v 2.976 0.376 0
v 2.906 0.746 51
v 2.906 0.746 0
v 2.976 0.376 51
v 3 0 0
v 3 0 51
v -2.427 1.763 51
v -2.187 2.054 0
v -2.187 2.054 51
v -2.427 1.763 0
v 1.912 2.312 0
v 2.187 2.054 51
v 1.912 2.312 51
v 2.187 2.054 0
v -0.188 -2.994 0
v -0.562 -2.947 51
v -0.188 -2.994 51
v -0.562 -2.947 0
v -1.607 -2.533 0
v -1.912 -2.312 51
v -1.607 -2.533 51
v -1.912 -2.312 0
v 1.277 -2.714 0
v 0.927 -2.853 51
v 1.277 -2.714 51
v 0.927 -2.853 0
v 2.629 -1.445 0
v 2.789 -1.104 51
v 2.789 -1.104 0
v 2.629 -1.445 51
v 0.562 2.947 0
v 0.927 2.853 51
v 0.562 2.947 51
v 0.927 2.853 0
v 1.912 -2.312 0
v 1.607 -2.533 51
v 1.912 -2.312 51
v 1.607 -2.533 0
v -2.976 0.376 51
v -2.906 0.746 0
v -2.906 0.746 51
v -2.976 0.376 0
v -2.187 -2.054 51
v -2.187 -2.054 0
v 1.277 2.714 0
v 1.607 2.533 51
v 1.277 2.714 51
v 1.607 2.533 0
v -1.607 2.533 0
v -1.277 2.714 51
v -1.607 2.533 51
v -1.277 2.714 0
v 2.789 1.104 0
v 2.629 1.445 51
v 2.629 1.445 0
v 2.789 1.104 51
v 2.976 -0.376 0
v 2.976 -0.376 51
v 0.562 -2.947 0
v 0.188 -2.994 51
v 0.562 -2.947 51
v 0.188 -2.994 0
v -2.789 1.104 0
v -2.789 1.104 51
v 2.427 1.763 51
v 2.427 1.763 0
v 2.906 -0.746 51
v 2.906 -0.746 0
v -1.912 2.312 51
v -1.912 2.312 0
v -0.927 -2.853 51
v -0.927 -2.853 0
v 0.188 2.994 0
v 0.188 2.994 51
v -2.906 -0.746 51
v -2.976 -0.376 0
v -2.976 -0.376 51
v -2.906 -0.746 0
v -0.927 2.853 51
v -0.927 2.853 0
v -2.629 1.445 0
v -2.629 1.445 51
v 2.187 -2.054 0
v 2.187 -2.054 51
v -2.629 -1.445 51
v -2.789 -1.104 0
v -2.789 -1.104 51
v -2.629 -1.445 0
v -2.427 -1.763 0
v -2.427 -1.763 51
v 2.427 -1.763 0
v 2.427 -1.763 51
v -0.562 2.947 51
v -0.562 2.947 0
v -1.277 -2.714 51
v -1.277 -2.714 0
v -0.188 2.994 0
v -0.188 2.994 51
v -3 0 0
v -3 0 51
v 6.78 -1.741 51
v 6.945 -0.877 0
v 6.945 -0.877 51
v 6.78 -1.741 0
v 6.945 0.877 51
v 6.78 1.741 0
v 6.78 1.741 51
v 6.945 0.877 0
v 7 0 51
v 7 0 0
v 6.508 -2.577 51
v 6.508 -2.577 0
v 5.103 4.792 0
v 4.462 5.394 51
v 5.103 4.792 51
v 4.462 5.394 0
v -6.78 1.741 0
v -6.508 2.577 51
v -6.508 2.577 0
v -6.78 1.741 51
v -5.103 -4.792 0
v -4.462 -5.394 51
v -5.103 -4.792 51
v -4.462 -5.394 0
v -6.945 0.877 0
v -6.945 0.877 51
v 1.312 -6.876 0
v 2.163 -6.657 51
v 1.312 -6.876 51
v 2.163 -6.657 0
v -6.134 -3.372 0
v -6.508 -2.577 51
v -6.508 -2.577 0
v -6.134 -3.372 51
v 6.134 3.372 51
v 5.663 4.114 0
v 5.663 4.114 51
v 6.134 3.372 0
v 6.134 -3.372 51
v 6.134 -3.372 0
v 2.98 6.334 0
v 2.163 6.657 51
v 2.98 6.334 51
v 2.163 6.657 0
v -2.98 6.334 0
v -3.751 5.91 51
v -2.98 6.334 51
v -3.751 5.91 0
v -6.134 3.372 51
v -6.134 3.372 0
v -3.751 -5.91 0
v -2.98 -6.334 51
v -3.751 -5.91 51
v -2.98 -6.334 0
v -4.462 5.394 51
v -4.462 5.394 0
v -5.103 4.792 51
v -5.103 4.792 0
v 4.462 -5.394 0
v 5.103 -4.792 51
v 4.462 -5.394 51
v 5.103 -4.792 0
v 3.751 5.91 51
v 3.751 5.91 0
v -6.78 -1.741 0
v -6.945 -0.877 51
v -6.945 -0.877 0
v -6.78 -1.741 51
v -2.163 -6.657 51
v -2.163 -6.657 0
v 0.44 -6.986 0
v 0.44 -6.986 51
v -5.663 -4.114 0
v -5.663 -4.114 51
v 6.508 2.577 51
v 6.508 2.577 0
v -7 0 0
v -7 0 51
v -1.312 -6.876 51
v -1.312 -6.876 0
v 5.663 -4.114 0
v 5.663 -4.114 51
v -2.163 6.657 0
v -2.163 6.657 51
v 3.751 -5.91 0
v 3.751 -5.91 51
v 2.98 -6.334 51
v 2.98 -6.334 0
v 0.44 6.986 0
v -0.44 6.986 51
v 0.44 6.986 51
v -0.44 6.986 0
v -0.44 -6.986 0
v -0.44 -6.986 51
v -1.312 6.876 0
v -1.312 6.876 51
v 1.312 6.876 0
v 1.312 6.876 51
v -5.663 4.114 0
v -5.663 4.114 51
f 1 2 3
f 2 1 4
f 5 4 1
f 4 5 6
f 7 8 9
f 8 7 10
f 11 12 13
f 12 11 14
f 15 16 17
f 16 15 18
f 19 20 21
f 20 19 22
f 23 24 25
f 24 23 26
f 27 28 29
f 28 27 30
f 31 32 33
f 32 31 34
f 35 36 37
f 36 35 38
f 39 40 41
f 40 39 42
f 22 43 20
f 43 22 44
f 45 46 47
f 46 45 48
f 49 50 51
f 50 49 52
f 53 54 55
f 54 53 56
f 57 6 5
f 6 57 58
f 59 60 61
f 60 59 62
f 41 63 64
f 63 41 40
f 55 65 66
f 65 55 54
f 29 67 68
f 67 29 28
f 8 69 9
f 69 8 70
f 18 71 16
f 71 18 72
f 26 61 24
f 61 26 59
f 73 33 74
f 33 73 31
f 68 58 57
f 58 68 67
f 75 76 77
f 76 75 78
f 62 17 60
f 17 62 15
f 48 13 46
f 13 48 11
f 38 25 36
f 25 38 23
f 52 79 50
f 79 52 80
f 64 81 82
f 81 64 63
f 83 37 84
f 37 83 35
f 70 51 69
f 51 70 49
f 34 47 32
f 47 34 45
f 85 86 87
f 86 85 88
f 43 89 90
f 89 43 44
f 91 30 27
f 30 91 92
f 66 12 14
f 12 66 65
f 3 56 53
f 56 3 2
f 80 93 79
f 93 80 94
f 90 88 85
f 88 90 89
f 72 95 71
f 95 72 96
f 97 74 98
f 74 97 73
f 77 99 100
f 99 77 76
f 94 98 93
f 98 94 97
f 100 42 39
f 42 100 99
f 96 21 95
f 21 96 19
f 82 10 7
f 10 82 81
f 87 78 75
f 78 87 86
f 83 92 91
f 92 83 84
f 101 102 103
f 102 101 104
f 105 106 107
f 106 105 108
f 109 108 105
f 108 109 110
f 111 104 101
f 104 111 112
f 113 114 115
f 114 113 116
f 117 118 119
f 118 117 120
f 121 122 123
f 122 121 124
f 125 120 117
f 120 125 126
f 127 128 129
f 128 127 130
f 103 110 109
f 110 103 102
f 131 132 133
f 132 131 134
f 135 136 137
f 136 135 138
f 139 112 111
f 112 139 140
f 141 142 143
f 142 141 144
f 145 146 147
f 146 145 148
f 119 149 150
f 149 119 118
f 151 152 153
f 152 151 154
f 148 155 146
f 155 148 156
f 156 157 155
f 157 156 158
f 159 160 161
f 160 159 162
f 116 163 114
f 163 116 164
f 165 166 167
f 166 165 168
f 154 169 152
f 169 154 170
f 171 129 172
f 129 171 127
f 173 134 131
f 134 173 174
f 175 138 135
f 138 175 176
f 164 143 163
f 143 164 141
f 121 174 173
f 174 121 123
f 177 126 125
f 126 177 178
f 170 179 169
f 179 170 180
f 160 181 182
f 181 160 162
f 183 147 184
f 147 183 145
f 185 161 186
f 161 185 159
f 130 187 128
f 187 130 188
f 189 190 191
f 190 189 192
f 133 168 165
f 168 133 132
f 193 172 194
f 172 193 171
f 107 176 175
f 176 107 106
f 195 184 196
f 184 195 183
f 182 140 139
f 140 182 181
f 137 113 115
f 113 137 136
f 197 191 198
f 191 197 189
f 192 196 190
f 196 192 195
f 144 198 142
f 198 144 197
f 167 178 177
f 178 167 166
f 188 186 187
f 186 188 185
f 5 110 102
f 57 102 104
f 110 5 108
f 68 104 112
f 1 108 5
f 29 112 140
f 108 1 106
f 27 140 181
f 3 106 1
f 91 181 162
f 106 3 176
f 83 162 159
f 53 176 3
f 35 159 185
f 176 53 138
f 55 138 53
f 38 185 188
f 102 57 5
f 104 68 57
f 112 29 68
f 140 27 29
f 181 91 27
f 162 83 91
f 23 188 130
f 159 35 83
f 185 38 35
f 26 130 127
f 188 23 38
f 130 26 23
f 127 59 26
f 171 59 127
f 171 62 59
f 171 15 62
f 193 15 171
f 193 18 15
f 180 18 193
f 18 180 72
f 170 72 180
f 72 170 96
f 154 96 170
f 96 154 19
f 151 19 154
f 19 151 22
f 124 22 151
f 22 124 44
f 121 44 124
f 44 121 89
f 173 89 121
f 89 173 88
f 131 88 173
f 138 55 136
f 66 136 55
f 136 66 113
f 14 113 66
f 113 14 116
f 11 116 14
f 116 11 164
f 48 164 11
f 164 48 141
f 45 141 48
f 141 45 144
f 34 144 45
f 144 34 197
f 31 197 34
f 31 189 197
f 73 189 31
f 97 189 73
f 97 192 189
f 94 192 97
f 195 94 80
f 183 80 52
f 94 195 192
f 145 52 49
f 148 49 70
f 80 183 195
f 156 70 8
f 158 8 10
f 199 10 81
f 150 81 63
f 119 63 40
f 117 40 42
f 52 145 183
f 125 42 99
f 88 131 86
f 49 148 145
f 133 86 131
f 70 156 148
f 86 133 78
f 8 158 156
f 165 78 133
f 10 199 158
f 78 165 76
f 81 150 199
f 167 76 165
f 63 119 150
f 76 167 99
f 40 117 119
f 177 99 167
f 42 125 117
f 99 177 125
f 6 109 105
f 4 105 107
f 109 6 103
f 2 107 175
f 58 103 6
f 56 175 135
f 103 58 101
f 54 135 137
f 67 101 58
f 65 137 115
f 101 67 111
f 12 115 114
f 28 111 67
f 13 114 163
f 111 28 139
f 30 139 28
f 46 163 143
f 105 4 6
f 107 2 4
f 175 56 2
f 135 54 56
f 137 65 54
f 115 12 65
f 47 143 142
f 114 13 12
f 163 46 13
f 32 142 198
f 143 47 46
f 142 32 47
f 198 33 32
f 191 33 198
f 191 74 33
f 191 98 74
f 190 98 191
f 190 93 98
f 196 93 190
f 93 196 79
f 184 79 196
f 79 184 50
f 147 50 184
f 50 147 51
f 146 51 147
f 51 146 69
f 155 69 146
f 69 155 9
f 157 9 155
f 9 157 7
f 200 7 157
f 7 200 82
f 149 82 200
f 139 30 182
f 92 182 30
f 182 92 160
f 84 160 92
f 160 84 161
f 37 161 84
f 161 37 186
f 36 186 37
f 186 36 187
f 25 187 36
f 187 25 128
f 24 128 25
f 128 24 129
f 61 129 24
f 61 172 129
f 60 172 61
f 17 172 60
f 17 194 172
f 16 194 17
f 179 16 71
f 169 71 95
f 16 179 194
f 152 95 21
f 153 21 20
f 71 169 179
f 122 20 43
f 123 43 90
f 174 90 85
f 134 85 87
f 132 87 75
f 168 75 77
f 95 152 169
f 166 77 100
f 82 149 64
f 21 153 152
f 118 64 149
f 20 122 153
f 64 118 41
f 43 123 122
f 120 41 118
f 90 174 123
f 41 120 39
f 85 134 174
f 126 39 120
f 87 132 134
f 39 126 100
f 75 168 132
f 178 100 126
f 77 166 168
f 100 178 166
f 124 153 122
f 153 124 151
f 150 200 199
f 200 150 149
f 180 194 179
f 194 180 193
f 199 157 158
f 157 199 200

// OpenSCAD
$fn = 50;


difference() {
	union() {
		cylinder(h = 51, r = 7.0000000000);
	}
	union() {
		translate(v = [0.0000000000, 0.0000000000, -100.0000000000]) {
			cylinder(h = 200, r = 3.0000000000);
		}
		translate(v = [0.0000000000, 0.0000000000, -100.0000000000]) {
			cylinder(h = 200, r = 3.0000000000);
		}
		translate(v = [0.0000000000, 0.0000000000, -100.0000000000]) {
			cylinder(h = 200, r = 3.0000000000);
		}
		translate(v = [0.0000000000, 0.0000000000, -100.0000000000]) {
			cylinder(h = 200, r = 3.0000000000);
		}
	}
}
